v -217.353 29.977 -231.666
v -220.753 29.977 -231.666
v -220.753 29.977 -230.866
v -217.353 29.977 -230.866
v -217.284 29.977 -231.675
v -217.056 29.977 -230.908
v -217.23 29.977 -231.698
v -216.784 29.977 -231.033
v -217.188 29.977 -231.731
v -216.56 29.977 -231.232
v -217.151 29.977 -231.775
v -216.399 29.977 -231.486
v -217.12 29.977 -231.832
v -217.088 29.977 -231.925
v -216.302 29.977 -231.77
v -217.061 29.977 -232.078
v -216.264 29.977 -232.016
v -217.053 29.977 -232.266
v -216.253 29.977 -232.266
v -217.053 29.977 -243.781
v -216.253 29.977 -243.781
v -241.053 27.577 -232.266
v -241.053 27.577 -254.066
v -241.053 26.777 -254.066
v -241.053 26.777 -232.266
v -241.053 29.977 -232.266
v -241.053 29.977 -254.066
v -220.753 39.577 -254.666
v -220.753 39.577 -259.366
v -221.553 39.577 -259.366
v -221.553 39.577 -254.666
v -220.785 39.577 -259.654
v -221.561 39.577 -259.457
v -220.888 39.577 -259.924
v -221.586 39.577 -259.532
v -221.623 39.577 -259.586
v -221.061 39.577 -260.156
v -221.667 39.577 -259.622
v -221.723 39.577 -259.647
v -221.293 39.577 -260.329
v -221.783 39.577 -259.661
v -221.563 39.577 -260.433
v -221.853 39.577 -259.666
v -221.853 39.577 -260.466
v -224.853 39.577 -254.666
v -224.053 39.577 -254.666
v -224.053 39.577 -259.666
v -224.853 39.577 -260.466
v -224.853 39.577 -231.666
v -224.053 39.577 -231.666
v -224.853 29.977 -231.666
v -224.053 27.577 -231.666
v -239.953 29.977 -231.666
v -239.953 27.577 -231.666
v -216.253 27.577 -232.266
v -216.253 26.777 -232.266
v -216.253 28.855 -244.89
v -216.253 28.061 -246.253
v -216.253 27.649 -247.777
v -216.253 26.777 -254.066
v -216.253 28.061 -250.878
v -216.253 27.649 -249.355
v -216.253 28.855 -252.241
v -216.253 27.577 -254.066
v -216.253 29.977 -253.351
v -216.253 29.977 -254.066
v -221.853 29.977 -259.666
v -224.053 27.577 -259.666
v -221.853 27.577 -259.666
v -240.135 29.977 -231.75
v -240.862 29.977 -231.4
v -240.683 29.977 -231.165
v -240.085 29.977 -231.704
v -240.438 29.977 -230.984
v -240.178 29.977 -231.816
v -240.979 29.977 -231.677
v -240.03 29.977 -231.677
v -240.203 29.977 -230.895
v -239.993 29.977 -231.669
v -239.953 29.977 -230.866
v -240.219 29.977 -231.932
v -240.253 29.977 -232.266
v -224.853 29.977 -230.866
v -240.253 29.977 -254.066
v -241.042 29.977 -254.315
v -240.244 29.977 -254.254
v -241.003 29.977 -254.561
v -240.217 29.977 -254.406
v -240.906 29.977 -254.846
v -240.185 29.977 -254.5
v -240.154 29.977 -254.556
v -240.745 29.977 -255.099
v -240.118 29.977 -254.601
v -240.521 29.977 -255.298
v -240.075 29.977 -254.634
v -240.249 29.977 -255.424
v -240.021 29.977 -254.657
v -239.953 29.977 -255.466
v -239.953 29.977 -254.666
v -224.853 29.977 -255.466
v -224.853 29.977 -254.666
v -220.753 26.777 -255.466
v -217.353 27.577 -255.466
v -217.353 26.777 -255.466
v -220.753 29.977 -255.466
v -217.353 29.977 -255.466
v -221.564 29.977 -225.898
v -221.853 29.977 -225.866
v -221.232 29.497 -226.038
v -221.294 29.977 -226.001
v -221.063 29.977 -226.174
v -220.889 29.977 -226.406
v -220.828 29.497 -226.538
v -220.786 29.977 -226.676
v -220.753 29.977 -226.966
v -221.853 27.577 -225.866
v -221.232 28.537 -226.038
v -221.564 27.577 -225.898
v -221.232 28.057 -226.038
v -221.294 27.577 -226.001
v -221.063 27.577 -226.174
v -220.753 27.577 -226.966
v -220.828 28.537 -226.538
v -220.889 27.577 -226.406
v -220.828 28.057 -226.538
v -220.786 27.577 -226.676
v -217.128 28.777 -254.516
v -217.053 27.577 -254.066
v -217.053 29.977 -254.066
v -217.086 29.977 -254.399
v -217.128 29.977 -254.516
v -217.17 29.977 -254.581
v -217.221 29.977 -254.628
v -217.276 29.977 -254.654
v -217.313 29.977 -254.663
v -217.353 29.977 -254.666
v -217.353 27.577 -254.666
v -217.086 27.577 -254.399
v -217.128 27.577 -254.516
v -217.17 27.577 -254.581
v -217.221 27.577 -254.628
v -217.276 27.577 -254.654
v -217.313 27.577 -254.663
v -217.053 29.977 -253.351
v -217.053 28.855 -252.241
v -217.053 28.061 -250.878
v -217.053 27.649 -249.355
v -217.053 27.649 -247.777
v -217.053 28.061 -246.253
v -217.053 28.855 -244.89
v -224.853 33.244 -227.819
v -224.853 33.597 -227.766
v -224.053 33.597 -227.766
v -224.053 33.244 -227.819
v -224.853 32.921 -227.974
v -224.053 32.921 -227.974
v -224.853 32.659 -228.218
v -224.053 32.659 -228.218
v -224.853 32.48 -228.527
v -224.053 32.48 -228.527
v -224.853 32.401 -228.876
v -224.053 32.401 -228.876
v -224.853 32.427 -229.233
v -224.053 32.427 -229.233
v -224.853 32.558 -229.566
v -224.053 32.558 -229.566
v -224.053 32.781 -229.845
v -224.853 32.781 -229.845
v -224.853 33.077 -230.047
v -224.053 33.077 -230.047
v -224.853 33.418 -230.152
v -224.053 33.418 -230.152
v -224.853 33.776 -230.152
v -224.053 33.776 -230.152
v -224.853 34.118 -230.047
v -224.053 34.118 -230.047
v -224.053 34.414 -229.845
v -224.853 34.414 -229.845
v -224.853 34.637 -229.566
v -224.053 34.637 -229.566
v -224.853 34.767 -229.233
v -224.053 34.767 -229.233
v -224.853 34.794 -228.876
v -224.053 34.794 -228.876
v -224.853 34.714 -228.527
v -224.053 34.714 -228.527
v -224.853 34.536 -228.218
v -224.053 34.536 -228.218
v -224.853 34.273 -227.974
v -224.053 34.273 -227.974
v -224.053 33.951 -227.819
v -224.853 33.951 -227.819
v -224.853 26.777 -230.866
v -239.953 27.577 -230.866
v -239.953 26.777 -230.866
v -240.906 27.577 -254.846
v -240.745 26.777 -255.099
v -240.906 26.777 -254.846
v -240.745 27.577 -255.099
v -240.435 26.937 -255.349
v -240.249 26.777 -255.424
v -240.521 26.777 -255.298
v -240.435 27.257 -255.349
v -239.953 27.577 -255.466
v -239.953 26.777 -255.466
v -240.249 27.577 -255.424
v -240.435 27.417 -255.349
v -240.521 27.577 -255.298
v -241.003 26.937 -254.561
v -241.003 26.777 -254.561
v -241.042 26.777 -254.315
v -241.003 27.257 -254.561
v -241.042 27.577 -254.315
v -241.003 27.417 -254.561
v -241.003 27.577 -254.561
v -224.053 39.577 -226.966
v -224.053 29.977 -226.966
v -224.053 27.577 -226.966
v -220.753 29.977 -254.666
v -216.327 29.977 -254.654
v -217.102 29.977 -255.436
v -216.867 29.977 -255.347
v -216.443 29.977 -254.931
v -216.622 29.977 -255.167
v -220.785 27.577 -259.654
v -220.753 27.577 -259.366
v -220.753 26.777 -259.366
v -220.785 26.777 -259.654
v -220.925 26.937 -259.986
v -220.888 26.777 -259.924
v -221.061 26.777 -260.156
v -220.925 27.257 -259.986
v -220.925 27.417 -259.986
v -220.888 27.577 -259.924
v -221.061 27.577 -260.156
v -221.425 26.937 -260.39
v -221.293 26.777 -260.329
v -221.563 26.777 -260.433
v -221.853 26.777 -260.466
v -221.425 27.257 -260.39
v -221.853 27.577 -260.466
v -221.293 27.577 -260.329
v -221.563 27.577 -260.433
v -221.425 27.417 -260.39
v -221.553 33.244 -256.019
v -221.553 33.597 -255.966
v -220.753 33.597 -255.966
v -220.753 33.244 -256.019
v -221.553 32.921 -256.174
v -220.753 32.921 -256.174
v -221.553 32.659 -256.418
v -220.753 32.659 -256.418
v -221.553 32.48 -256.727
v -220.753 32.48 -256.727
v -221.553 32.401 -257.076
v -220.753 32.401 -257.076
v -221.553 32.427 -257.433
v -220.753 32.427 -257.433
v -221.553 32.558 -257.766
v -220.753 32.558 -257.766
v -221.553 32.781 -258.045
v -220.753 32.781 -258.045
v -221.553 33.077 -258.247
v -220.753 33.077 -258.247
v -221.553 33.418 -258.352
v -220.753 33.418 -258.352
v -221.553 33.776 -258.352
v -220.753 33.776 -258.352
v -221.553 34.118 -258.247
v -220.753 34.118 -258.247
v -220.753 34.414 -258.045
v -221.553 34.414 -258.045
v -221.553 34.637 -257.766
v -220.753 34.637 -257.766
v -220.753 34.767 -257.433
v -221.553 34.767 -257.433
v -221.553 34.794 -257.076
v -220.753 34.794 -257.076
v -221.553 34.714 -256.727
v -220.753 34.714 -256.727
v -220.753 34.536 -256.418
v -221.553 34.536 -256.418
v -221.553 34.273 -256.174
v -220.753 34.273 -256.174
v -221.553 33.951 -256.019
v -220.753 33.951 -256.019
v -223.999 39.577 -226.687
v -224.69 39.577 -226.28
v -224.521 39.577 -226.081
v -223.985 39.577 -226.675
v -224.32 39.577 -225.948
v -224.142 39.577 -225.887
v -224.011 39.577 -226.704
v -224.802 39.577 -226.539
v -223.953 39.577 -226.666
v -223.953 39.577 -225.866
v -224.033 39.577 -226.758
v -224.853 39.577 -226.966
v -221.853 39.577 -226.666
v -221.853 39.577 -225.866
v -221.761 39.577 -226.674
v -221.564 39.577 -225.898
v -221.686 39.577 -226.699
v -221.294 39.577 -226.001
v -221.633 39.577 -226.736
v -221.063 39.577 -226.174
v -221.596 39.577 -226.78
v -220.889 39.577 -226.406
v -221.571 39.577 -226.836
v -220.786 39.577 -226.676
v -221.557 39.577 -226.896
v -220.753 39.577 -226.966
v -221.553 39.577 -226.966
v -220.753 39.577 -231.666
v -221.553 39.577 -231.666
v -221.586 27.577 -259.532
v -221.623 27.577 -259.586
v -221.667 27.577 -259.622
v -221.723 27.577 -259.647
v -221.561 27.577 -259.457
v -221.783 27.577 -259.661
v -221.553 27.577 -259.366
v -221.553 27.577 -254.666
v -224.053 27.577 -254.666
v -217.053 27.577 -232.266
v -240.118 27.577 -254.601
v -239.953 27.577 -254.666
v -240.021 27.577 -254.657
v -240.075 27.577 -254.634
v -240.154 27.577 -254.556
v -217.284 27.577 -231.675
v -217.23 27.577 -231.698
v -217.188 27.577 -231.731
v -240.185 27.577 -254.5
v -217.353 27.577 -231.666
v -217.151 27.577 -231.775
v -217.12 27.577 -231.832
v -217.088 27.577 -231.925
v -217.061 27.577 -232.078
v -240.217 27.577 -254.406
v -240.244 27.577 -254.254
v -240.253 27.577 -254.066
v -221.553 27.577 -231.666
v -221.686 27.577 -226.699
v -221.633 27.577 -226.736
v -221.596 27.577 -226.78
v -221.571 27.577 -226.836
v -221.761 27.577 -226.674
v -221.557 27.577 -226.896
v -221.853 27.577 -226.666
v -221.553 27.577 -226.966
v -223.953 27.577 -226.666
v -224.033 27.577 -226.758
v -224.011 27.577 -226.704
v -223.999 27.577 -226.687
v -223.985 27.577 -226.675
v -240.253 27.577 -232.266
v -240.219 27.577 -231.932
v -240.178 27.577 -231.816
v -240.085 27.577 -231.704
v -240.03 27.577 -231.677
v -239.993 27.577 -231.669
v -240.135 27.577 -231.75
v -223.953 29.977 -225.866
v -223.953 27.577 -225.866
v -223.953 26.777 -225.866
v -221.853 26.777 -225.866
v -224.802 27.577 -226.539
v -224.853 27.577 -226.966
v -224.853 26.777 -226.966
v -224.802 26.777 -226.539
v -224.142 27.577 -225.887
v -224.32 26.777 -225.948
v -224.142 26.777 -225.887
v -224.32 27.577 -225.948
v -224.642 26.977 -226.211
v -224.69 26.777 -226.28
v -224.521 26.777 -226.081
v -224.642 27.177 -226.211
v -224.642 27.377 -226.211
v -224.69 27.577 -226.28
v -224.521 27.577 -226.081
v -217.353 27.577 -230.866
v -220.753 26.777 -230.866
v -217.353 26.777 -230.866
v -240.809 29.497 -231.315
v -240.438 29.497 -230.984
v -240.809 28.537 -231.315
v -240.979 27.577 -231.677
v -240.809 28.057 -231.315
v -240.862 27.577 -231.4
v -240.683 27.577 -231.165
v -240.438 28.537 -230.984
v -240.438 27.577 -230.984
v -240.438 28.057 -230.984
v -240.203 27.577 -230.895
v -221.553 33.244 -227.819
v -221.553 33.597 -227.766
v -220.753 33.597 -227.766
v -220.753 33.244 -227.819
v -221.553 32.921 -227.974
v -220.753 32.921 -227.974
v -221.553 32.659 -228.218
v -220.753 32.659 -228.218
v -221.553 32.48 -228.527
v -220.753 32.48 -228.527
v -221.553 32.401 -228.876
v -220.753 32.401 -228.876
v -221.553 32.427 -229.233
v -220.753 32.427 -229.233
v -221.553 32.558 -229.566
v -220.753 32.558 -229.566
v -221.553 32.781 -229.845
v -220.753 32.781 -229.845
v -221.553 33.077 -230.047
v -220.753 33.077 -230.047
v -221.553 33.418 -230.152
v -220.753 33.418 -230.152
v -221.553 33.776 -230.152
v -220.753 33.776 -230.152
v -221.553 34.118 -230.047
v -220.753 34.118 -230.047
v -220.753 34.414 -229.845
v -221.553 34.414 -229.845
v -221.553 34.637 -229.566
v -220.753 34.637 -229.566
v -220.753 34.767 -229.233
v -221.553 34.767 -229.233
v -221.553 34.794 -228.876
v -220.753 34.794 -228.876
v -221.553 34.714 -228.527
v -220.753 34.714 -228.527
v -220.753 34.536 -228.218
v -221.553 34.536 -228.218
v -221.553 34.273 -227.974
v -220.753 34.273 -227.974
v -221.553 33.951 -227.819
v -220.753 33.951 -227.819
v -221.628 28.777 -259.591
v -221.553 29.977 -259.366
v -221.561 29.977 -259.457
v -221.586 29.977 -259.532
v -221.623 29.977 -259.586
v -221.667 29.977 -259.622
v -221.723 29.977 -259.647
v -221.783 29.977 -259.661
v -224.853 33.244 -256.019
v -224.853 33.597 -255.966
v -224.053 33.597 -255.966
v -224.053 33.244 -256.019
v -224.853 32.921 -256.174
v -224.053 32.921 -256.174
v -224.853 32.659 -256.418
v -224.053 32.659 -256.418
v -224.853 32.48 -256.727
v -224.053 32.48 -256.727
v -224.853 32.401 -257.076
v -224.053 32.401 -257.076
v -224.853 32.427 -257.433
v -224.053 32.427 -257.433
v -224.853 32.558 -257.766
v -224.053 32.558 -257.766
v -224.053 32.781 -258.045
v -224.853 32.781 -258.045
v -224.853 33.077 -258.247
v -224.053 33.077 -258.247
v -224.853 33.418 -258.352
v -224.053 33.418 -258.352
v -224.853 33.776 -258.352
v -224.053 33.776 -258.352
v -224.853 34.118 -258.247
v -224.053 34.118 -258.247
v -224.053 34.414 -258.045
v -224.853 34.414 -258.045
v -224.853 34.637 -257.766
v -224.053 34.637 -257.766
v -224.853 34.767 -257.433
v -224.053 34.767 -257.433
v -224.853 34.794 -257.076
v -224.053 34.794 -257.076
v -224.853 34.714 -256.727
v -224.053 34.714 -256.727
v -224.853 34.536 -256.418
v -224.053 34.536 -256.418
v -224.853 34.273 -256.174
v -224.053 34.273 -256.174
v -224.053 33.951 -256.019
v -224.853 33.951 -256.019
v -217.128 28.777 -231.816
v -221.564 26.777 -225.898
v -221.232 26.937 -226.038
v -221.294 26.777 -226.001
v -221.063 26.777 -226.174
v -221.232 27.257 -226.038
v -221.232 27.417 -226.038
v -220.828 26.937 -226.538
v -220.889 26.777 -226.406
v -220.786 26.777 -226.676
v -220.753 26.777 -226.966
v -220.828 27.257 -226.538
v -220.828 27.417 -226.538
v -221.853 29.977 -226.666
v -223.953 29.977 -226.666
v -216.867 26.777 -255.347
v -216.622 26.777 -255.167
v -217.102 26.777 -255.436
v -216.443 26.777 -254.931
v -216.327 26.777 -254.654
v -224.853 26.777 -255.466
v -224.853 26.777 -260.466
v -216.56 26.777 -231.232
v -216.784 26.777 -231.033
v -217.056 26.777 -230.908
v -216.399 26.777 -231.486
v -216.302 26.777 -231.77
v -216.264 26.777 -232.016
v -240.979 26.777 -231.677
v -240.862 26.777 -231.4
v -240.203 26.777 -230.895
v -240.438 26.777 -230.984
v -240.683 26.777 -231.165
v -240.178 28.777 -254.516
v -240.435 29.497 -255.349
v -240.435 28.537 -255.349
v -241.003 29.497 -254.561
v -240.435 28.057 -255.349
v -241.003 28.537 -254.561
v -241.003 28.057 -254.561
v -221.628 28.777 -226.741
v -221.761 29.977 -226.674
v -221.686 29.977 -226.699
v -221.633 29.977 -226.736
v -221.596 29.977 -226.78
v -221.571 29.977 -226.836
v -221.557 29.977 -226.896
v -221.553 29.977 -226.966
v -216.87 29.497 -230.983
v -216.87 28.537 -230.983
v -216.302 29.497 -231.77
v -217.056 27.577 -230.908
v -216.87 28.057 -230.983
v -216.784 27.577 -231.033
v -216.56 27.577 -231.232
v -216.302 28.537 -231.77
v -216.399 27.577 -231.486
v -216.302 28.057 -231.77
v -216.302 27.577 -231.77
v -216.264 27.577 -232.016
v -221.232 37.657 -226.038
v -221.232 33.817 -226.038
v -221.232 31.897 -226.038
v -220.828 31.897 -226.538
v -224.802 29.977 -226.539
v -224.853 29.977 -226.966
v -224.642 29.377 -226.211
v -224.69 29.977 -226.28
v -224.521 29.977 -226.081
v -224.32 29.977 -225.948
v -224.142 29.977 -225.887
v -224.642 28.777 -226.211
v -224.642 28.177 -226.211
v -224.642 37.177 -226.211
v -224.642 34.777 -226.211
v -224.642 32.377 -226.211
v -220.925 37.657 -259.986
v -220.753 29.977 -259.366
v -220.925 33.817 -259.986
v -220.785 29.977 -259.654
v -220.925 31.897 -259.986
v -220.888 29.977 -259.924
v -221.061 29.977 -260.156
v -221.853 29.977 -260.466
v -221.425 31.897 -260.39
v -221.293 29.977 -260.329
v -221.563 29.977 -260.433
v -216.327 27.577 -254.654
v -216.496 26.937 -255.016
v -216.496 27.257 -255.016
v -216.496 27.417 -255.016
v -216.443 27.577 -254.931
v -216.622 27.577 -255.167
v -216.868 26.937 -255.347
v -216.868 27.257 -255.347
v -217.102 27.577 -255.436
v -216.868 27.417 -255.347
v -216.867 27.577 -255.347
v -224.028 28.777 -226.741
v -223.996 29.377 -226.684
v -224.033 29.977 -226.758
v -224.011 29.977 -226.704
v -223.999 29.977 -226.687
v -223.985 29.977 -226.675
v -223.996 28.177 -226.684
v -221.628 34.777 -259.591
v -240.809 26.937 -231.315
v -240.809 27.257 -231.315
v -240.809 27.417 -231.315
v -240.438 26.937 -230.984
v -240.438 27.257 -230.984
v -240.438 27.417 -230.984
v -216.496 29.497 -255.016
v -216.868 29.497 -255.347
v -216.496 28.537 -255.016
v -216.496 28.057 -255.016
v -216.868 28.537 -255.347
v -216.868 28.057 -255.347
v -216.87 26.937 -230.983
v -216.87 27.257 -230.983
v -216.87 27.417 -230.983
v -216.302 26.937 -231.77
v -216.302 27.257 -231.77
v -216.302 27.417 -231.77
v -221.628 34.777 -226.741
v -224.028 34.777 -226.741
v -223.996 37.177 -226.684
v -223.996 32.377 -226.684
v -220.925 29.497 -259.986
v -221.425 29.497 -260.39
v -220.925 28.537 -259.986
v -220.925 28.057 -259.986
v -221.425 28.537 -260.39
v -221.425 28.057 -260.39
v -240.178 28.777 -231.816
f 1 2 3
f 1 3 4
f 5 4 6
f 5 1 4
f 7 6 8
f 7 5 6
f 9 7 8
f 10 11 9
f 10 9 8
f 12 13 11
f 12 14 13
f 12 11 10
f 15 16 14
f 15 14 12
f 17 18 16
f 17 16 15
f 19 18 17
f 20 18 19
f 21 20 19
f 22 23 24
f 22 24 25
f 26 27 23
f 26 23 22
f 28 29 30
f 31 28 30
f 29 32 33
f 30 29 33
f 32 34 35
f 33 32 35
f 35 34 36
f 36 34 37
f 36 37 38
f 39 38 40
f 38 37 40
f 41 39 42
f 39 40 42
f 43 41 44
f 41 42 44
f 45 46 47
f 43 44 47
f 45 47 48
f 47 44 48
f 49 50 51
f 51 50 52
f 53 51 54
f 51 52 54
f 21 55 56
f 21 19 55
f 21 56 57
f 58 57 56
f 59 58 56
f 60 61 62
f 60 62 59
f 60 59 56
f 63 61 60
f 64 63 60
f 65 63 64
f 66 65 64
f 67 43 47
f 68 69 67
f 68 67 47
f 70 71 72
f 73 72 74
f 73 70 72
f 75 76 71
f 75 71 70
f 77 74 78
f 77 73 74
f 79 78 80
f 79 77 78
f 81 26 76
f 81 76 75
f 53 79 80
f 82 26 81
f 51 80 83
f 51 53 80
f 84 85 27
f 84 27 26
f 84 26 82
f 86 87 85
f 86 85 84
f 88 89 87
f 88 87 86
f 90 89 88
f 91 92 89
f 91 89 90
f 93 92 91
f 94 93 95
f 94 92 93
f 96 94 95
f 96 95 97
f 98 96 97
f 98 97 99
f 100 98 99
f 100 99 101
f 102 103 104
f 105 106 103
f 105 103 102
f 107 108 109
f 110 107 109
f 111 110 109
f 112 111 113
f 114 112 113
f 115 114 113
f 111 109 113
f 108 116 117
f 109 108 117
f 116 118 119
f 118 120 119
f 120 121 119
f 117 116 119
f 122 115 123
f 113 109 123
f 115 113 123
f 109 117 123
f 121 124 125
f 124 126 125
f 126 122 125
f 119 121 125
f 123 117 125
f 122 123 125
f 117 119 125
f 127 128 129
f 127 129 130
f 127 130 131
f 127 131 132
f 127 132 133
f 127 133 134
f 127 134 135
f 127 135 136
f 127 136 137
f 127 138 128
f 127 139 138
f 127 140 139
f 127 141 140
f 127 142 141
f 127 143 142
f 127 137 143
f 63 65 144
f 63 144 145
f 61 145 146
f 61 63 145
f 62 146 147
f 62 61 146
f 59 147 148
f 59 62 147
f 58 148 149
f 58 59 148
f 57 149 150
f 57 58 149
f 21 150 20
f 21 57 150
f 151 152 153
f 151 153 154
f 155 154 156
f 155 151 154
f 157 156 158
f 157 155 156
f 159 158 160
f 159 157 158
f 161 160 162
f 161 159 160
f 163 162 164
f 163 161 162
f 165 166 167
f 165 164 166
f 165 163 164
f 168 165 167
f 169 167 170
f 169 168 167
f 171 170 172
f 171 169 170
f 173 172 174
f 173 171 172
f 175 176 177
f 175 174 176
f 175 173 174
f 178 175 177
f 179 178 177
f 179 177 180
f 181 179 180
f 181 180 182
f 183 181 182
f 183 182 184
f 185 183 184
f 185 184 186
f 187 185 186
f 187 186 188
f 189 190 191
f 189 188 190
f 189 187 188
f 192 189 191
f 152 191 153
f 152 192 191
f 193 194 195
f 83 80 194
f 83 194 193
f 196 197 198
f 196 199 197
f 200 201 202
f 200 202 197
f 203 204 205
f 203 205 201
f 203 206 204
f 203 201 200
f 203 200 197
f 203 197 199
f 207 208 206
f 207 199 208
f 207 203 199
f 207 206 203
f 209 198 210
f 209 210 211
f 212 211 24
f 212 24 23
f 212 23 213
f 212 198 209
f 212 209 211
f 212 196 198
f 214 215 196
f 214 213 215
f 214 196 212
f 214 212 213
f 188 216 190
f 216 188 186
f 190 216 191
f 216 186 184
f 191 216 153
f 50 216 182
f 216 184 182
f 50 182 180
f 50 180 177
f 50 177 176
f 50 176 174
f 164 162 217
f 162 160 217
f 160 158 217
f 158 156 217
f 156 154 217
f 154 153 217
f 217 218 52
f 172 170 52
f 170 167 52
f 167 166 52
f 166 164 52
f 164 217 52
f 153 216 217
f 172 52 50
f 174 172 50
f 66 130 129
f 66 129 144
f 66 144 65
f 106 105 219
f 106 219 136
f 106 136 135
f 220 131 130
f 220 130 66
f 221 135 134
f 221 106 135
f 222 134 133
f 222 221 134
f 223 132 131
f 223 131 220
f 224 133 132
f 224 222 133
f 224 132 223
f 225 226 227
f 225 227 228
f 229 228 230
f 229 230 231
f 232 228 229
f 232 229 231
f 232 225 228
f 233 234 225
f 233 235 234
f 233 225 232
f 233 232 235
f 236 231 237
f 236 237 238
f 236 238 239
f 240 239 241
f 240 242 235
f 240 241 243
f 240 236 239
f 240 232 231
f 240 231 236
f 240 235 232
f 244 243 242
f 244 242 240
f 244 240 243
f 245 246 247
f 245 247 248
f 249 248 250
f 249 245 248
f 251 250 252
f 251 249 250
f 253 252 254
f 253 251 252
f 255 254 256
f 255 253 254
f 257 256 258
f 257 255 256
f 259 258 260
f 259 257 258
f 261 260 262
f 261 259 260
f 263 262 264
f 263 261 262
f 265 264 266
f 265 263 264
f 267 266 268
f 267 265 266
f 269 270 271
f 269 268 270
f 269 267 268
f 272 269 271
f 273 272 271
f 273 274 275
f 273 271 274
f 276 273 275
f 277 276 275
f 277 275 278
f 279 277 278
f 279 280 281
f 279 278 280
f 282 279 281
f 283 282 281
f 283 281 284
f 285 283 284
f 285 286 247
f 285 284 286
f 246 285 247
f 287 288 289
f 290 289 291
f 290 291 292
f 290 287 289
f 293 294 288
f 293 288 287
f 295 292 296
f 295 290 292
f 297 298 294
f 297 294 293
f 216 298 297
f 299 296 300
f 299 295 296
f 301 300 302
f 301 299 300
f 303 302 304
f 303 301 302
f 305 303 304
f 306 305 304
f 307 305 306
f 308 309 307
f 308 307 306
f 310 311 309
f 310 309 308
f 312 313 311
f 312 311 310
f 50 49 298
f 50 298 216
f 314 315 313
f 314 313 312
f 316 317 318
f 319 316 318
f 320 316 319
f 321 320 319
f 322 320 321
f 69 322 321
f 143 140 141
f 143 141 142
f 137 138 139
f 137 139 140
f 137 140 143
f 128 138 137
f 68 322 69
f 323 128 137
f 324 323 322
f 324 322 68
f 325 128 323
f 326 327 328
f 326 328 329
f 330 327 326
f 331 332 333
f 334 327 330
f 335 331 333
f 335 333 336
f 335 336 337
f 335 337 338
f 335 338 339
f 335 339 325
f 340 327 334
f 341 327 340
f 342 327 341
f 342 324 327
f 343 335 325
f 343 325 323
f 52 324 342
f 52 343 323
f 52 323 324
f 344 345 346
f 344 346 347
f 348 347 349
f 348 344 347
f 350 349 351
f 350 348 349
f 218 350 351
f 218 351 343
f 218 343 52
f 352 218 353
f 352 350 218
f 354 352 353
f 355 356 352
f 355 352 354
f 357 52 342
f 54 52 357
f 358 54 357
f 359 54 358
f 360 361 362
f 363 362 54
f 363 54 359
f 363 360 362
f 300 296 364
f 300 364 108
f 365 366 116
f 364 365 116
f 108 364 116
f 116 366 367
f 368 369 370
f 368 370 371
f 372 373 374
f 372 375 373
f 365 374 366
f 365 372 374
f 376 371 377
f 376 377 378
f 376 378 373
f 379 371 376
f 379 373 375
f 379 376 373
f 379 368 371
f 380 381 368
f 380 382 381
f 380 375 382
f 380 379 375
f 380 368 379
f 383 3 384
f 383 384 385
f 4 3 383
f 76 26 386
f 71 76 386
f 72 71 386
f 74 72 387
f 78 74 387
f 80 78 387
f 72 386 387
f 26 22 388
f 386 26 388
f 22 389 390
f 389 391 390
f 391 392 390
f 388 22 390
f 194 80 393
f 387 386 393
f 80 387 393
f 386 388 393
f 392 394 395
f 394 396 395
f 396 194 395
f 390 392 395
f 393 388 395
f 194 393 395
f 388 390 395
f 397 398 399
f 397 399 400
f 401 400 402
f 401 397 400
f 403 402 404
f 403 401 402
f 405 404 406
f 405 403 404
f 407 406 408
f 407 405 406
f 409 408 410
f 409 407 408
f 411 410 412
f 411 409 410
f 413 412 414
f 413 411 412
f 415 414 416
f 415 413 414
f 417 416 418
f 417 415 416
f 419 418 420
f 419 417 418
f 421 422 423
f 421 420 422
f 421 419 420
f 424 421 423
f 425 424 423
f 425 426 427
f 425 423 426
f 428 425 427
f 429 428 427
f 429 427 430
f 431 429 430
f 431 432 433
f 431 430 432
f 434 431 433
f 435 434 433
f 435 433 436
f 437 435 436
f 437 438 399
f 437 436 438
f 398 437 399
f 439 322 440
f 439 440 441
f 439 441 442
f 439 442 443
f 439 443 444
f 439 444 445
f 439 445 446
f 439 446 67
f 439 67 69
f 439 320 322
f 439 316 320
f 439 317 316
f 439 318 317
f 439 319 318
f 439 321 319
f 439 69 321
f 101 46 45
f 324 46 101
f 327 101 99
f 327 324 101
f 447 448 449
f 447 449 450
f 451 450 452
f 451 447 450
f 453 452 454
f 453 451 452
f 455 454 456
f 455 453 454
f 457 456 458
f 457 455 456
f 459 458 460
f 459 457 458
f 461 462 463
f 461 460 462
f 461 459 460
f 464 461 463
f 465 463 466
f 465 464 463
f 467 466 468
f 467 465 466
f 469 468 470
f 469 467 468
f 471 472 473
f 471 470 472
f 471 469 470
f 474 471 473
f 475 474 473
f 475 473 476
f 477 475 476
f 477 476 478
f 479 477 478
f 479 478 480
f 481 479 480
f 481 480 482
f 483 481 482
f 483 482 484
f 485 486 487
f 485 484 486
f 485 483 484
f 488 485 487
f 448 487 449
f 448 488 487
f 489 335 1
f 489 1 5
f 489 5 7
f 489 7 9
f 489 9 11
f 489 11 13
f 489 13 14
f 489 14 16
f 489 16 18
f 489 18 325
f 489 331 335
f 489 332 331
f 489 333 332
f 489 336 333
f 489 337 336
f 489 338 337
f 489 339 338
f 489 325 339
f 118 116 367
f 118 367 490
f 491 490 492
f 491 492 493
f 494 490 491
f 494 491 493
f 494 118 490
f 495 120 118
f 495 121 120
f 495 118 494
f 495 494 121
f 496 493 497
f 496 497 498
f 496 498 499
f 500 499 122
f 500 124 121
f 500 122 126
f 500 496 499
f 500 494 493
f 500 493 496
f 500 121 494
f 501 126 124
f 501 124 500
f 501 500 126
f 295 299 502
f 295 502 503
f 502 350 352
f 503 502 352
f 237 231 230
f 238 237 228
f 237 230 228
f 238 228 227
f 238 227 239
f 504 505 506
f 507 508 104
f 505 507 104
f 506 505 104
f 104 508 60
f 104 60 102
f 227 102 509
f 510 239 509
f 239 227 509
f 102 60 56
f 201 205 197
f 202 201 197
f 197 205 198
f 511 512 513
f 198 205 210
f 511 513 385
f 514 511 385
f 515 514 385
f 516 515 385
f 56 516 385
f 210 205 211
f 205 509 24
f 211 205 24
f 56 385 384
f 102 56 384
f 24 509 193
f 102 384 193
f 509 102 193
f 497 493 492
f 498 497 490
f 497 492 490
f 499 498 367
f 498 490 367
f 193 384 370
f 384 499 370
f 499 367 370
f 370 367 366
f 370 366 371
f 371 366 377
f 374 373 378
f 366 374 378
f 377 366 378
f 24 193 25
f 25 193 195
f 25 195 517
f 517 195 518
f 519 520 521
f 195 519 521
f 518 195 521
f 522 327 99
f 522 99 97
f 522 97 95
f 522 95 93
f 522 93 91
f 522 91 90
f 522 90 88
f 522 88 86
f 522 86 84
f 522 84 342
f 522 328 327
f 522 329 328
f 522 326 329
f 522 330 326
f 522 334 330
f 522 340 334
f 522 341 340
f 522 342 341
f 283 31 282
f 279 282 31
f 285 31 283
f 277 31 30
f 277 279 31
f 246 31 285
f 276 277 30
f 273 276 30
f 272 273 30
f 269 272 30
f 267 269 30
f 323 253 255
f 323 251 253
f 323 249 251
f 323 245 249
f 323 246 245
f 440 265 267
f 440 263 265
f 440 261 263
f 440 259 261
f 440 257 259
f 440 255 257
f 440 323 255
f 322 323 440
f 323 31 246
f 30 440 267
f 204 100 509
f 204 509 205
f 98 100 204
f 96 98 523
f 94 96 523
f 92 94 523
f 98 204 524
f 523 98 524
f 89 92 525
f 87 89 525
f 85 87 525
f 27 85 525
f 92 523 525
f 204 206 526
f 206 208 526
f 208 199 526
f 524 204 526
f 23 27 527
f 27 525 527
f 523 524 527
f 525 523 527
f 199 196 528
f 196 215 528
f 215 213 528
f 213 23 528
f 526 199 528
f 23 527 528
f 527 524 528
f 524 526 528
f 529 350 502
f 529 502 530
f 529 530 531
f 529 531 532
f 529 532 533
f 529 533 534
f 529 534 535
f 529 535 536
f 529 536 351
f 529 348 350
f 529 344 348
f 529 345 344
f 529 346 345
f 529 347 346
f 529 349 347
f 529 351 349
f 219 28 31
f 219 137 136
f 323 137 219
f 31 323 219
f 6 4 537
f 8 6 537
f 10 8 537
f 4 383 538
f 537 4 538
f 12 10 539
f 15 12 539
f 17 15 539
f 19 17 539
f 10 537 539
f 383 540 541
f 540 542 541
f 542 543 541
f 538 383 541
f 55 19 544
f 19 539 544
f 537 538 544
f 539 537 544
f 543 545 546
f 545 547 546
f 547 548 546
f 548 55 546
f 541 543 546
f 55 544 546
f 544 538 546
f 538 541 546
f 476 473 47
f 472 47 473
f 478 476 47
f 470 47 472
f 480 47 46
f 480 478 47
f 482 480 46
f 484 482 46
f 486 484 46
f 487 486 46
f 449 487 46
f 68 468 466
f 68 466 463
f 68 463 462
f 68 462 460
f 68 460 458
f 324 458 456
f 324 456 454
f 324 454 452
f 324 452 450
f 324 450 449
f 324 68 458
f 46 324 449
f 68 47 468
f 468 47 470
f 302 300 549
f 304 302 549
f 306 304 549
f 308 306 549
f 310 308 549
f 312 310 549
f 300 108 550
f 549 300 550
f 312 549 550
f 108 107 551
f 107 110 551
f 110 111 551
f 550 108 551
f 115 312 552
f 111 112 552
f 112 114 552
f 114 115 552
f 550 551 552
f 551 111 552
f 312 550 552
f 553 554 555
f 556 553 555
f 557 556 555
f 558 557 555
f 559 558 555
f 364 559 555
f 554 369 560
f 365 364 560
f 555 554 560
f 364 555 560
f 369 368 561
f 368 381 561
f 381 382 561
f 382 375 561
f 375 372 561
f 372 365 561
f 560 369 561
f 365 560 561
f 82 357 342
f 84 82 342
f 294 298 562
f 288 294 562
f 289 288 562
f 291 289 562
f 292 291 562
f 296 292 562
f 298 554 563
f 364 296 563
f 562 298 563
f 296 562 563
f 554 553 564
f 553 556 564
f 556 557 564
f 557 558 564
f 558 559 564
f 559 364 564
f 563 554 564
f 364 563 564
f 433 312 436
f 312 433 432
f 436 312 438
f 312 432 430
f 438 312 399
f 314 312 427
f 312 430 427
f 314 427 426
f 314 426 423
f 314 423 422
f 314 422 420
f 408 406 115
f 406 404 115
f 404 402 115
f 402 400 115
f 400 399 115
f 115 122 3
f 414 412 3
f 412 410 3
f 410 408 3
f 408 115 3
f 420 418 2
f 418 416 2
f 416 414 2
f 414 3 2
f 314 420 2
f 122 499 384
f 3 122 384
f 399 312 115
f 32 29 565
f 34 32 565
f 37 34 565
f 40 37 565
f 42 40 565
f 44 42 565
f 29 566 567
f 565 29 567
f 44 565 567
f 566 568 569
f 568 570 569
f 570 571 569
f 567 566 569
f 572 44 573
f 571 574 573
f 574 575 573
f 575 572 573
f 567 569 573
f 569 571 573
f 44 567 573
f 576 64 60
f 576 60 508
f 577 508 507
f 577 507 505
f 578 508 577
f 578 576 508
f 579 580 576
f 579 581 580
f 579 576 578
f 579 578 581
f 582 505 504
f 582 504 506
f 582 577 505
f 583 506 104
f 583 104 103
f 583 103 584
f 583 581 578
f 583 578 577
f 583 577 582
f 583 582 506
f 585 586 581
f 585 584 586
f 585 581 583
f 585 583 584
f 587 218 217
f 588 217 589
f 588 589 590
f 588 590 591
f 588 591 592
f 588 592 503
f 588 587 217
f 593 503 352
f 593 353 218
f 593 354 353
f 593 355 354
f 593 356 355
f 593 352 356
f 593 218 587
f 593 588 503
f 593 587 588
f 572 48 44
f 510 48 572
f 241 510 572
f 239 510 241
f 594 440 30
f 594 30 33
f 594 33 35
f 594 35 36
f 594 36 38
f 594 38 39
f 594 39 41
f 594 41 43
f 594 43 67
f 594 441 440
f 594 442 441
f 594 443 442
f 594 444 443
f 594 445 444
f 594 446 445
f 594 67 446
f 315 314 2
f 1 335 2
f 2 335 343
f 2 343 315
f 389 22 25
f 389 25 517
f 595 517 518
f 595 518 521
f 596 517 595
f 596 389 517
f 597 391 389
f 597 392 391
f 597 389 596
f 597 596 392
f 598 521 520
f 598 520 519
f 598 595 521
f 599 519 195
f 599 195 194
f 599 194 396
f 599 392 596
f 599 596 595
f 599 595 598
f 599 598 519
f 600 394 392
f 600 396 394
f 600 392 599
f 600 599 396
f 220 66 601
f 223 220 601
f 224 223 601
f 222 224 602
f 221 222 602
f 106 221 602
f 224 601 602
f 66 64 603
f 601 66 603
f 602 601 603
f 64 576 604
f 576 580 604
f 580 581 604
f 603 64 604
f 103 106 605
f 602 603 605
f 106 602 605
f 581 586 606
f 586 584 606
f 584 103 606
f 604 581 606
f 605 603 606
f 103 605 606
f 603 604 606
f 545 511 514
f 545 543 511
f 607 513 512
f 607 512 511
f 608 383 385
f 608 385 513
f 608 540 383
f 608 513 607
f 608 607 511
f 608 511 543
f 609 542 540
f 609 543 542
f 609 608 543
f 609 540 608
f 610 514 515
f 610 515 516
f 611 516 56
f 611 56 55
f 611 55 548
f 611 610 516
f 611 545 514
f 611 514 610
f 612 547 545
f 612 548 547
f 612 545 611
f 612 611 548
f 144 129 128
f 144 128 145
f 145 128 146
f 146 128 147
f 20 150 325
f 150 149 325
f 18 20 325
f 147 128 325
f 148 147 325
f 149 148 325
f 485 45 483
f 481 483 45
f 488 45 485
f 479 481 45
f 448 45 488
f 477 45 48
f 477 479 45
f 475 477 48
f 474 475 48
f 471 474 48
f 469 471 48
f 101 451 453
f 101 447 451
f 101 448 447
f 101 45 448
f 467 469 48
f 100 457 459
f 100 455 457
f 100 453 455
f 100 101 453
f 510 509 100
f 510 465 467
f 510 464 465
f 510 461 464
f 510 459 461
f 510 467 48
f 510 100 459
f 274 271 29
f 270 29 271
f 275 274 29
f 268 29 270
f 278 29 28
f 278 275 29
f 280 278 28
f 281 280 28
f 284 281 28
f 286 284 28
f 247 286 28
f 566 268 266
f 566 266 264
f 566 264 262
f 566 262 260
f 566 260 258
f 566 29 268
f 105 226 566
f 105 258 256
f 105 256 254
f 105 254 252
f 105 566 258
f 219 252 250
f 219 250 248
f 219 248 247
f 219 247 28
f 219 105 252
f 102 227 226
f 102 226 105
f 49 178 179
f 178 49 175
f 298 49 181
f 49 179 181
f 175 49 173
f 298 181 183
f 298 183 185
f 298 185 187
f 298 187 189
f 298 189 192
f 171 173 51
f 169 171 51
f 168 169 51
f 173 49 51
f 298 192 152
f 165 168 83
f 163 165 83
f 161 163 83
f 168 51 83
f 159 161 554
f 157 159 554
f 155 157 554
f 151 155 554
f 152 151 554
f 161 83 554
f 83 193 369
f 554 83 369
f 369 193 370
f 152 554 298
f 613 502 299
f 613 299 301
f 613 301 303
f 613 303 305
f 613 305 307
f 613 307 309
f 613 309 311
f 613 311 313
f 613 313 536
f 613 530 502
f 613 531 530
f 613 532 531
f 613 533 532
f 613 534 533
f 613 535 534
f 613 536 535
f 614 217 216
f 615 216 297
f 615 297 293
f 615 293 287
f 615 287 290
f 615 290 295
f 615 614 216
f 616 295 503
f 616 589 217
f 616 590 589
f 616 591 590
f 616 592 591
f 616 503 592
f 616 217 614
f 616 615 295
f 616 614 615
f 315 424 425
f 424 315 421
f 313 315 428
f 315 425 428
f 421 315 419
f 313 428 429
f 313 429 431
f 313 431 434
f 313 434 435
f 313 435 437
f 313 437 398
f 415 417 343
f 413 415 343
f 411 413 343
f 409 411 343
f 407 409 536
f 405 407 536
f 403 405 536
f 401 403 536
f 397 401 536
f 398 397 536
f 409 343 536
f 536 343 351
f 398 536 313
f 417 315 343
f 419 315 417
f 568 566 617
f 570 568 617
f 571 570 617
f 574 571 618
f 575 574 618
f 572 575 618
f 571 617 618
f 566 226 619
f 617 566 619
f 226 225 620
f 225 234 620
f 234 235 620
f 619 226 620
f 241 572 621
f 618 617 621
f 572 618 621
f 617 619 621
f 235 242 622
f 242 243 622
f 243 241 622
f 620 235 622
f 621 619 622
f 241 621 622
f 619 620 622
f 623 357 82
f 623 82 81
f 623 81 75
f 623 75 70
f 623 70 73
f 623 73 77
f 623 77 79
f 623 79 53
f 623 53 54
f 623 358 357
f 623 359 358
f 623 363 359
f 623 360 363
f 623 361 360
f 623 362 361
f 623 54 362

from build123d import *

# Parameters (mm, degrees)
EXTRUDE_THIN1_DEPTH     = 2.4
CUT_EXTRUDE1_DEPTH      = 10
BOSS_EXTRUDE1_DEPTH     = 0.8
BOSS_EXTRUDE2_DEPTH     = 9.6
CUT_EXTRUDE2_DEPTH      = 10
CUT_EXTRUDE2_DEPTH_BACK = 9.6
SKETCH5_R               = 1.2
BOSS_EXTRUDE3_DEPTH     = 9.6
CUT_EXTRUDE3_DEPTH      = 10
CUT_EXTRUDE3_DEPTH_BACK = 9.6
SKETCH8_R               = 1.2


# Read off the part's stored shape, not the designer's step: Extrude-Thin1
with BuildPart() as part:
    # Extrude-Thin1 outline → Extrude-Thin1 (new body)
    with BuildSketch(Plane(origin=(0, 27.577339236, 0), x_dir=(1, 0, 0), z_dir=(0, 1, 0))):
        with BuildLine():
            Line((-221.85268026, 260.465727588), (-224.85268026, 260.465727588))
            Line((-224.85268026, 260.465727588), (-224.85268026, 255.465727588))
            Line((-224.85268026, 255.465727588), (-239.95268026, 255.465727588))
            add(Edge.make_bspline(
                [(-239.95268026, 255.465727588), (-240.036953855, 255.465727588), (-240.119634905, 255.456128928), (-240.281715302, 255.417151974), (-240.361409143, 255.387305758), (-240.582321505, 255.271729013), (-240.710305754, 255.157186074), (-240.902423276, 254.88238325), (-240.965907148, 254.723899526), (-241.040211449, 254.398738857), (-241.05268026, 254.23302474), (-241.05268026, 254.065727588)],
                knots=[0, 0, 0, 0, 0.125, 0.125, 0.25, 0.25, 0.5, 0.5, 0.75, 0.75, 1, 1, 1, 1], degree=3))
            Line((-241.05268026, 254.065727588), (-241.05268026, 232.26572715))
            add(Edge.make_bspline(
                [(-241.05268026, 232.26572715), (-241.05268026, 232.098807375), (-241.040173408, 231.934007095), (-240.967365099, 231.612506131), (-240.904171119, 231.452780727), (-240.761375105, 231.246738134), (-240.705083291, 231.182493851), (-240.580845123, 231.071317608), (-240.512324697, 231.023373693), (-240.287950739, 230.905193813), (-240.121895067, 230.865727588), (-239.95268026, 230.865727588)],
                knots=[0, 0, 0, 0, 0.25, 0.25, 0.5, 0.5, 0.625, 0.625, 0.75, 0.75, 1, 1, 1, 1], degree=3))
            Line((-239.95268026, 230.865727588), (-224.85268026, 230.865727588))
            Line((-224.85268026, 230.865727588), (-224.85268026, 226.965727588))
            add(Edge.make_bspline(
                [(-224.85268026, 226.965727588), (-224.85268026, 226.832263963), (-224.842915454, 226.699977447), (-224.778312529, 226.440837832), (-224.722765281, 226.317121604), (-224.561642632, 226.104378576), (-224.457129257, 226.016716914), (-224.220278277, 225.897626505), (-224.087183417, 225.865727588), (-223.95268026, 225.865727588)],
                knots=[0, 0, 0, 0, 0.25, 0.25, 0.5, 0.5, 0.75, 0.75, 1, 1, 1, 1], degree=3))
            Line((-223.95268026, 225.865727588), (-221.85268026, 225.865727588))
            add(Edge.make_bspline(
                [(-221.85268026, 225.865727588), (-221.706401491, 225.865727588), (-221.561598635, 225.889080891), (-221.357734958, 225.966629211), (-221.293267189, 225.998955372), (-221.171531343, 226.076981138), (-221.11379386, 226.123323344), (-220.960069989, 226.2768079), (-220.879771324, 226.40237724), (-220.776526804, 226.672909538), (-220.75268026, 226.819308973), (-220.75268026, 226.965727588)],
                knots=[0, 0, 0, 0, 0.25, 0.25, 0.375, 0.375, 0.5, 0.5, 0.75, 0.75, 1, 1, 1, 1], degree=3))
            Line((-220.75268026, 226.965727588), (-220.75268026, 230.865727588))
            Line((-220.75268026, 230.865727588), (-217.35268026, 230.865727588))
            add(Edge.make_bspline(
                [(-217.35268026, 230.865727588), (-217.268406659, 230.865727588), (-217.185725604, 230.875326251), (-217.023645197, 230.914303211), (-216.943951352, 230.944149433), (-216.723038981, 231.059726197), (-216.595054733, 231.174269153), (-216.402937217, 231.449072013), (-216.339453355, 231.607555751), (-216.265149067, 231.932716443), (-216.25268026, 232.098430571), (-216.25268026, 232.265727733)],
                knots=[0, 0, 0, 0, 0.125, 0.125, 0.25, 0.25, 0.5, 0.5, 0.75, 0.75, 1, 1, 1, 1], degree=3))
            Line((-216.25268026, 232.265727733), (-216.25268026, 254.065727588))
            add(Edge.make_bspline(
                [(-216.25268026, 254.065727588), (-216.25268026, 254.232647394), (-216.265187101, 254.397447706), (-216.337995368, 254.718948734), (-216.401189322, 254.878674187), (-216.543985311, 255.084716854), (-216.600277123, 255.148961165), (-216.724515296, 255.260137461), (-216.793035717, 255.308081394), (-217.017409717, 255.426261342), (-217.183465417, 255.465727588), (-217.35268026, 255.465727588)],
                knots=[0, 0, 0, 0, 0.25, 0.25, 0.5, 0.5, 0.625, 0.625, 0.75, 0.75, 1, 1, 1, 1], degree=3))
            Line((-217.35268026, 255.465727588), (-220.75268026, 255.465727588))
            Line((-220.75268026, 255.465727588), (-220.75268026, 259.365727588))
            add(Edge.make_bspline(
                [(-220.75268026, 259.365727588), (-220.75268026, 259.512006357), (-220.776033562, 259.656809213), (-220.853581882, 259.86067289), (-220.885908043, 259.925140659), (-220.96393381, 260.046876505), (-221.010276016, 260.104613988), (-221.163760572, 260.258337859), (-221.289329911, 260.338636524), (-221.559862209, 260.441881044), (-221.706261645, 260.465727588), (-221.85268026, 260.465727588)],
                knots=[0, 0, 0, 0, 0.25, 0.25, 0.375, 0.375, 0.5, 0.5, 0.75, 0.75, 1, 1, 1, 1], degree=3))
        make_face()
        with BuildLine():
            Line((-224.05268026, 254.665727588), (-224.05268026, 259.665727588))
            Line((-224.05268026, 259.665727588), (-221.85268026, 259.665727588))
            add(Edge.make_bspline(
                [(-221.55268026, 259.365727588), (-221.55268026, 259.665727588), (-221.85268026, 259.665727588)],
                knots=[0, 0, 0, 1, 1, 1], degree=2))
            Line((-221.55268026, 259.365727588), (-221.55268026, 254.665727588))
            Line((-221.55268026, 254.665727588), (-217.35268026, 254.665727588))
            add(Edge.make_bspline(
                [(-217.05268026, 254.065727588), (-217.05268026, 254.665727588), (-217.35268026, 254.665727588)],
                knots=[0, 0, 0, 1, 1, 1], degree=2))
            Line((-217.05268026, 254.065727588), (-217.05268026, 232.265727733))
            add(Edge.make_bspline(
                [(-217.35268026, 231.665727588), (-217.05268026, 231.665727588), (-217.05268026, 232.265727733)],
                knots=[0, 0, 0, 1, 1, 1], degree=2))
            Line((-217.35268026, 231.665727588), (-221.55268026, 231.665727588))
            Line((-221.55268026, 231.665727588), (-221.55268026, 226.965727588))
            add(Edge.make_bspline(
                [(-221.85268026, 226.665727588), (-221.55268026, 226.665727588), (-221.55268026, 226.965727588)],
                knots=[0, 0, 0, 1, 1, 1], degree=2))
            Line((-221.85268026, 226.665727588), (-223.95268026, 226.665727588))
            add(Edge.make_bspline(
                [(-224.05268026, 226.965727588), (-224.05268026, 226.665727588), (-223.95268026, 226.665727588)],
                knots=[0, 0, 0, 1, 1, 1], degree=2))
            Line((-224.05268026, 226.965727588), (-224.05268026, 231.665727588))
            Line((-224.05268026, 231.665727588), (-239.95268026, 231.665727588))
            add(Edge.make_bspline(
                [(-240.25268026, 232.26572715), (-240.25268026, 231.665727588), (-239.95268026, 231.665727588)],
                knots=[0, 0, 0, 1, 1, 1], degree=2))
            Line((-240.25268026, 232.26572715), (-240.25268026, 254.065727588))
            add(Edge.make_bspline(
                [(-239.95268026, 254.665727588), (-240.25268026, 254.665727588), (-240.25268026, 254.065727588)],
                knots=[0, 0, 0, 1, 1, 1], degree=2))
            Line((-239.95268026, 254.665727588), (-224.05268026, 254.665727588))
        make_face(mode=Mode.SUBTRACT)
    extrude(amount=EXTRUDE_THIN1_DEPTH)

    # Sketch2 → Cut-Extrude1 (cut)
    with BuildSketch(Plane(origin=(-216.25268026, 0, 0), x_dir=(0, 0, -1), z_dir=(1, 0, 0))):
        with BuildLine():
            Line((243.543526876, 30.314428941), (253.35066228, 29.977339236))
            ThreePointArc((253.35066228, 29.977339236), (248.359618009, 27.600880377), (243.543526876, 30.314428941))
        make_face()
    extrude(amount=-CUT_EXTRUDE1_DEPTH, mode=Mode.SUBTRACT)

    # Sketch3 → Boss-Extrude1 (add)
    with BuildSketch(Plane.XZ.offset(-27.577339236)):
        with BuildLine():
            Line((-217.35268026, -255.465727588), (-220.75268026, -255.465727588))
            Line((-220.75268026, -255.465727588), (-220.75268026, -259.365727588))
            add(Edge.make_bspline(
                [(-220.75268026, -259.365727588), (-220.75268026, -259.512006357), (-220.776033562, -259.656809213), (-220.853581882, -259.86067289), (-220.885908043, -259.925140659), (-220.96393381, -260.046876505), (-221.010276016, -260.104613988), (-221.163760572, -260.258337859), (-221.289329911, -260.338636524), (-221.559862209, -260.441881044), (-221.706261645, -260.465727588), (-221.85268026, -260.465727588)],
                knots=[0, 0, 0, 0, 0.25, 0.25, 0.375, 0.375, 0.5, 0.5, 0.75, 0.75, 1, 1, 1, 1], degree=3))
            Line((-221.85268026, -260.465727588), (-224.85268026, -260.465727588))
            Line((-224.85268026, -260.465727588), (-224.85268026, -255.465727588))
            Line((-224.85268026, -255.465727588), (-239.95268026, -255.465727588))
            add(Edge.make_bspline(
                [(-239.95268026, -255.465727588), (-240.036953855, -255.465727588), (-240.119634905, -255.456128928), (-240.281715302, -255.417151974), (-240.361409143, -255.387305758), (-240.582321505, -255.271729013), (-240.710305754, -255.157186074), (-240.902423276, -254.88238325), (-240.965907148, -254.723899526), (-241.040211449, -254.398738857), (-241.05268026, -254.23302474), (-241.05268026, -254.065727588)],
                knots=[0, 0, 0, 0, 0.125, 0.125, 0.25, 0.25, 0.5, 0.5, 0.75, 0.75, 1, 1, 1, 1], degree=3))
            Line((-241.05268026, -254.065727588), (-241.05268026, -232.26572715))
            add(Edge.make_bspline(
                [(-241.05268026, -232.26572715), (-241.05268026, -232.098807375), (-241.040173408, -231.934007095), (-240.967365099, -231.612506131), (-240.904171119, -231.452780727), (-240.761375105, -231.246738134), (-240.705083291, -231.182493851), (-240.580845123, -231.071317608), (-240.512324697, -231.023373693), (-240.287950739, -230.905193813), (-240.121895067, -230.865727588), (-239.95268026, -230.865727588)],
                knots=[0, 0, 0, 0, 0.25, 0.25, 0.5, 0.5, 0.625, 0.625, 0.75, 0.75, 1, 1, 1, 1], degree=3))
            Line((-239.95268026, -230.865727588), (-224.85268026, -230.865727588))
            Line((-224.85268026, -230.865727588), (-224.85268026, -226.965727588))
            add(Edge.make_bspline(
                [(-224.85268026, -226.965727588), (-224.85268026, -226.832263963), (-224.842915454, -226.699977447), (-224.778312529, -226.440837832), (-224.722765281, -226.317121604), (-224.561642632, -226.104378576), (-224.457129257, -226.016716914), (-224.220278277, -225.897626505), (-224.087183417, -225.865727588), (-223.95268026, -225.865727588)],
                knots=[0, 0, 0, 0, 0.25, 0.25, 0.5, 0.5, 0.75, 0.75, 1, 1, 1, 1], degree=3))
            Line((-223.95268026, -225.865727588), (-221.85268026, -225.865727588))
            add(Edge.make_bspline(
                [(-221.85268026, -225.865727588), (-221.706401491, -225.865727588), (-221.561598635, -225.889080891), (-221.357734958, -225.966629211), (-221.293267189, -225.998955372), (-221.171531343, -226.076981138), (-221.11379386, -226.123323344), (-220.960069989, -226.2768079), (-220.879771324, -226.40237724), (-220.776526804, -226.672909538), (-220.75268026, -226.819308973), (-220.75268026, -226.965727588)],
                knots=[0, 0, 0, 0, 0.25, 0.25, 0.375, 0.375, 0.5, 0.5, 0.75, 0.75, 1, 1, 1, 1], degree=3))
            Line((-220.75268026, -226.965727588), (-220.75268026, -230.865727588))
            Line((-220.75268026, -230.865727588), (-217.35268026, -230.865727588))
            add(Edge.make_bspline(
                [(-217.35268026, -230.865727588), (-217.268406659, -230.865727588), (-217.185725604, -230.875326251), (-217.023645197, -230.914303211), (-216.943951352, -230.944149433), (-216.723038981, -231.059726197), (-216.595054733, -231.174269153), (-216.402937217, -231.449072013), (-216.339453355, -231.607555751), (-216.265149067, -231.932716443), (-216.25268026, -232.098430571), (-216.25268026, -232.265727733)],
                knots=[0, 0, 0, 0, 0.125, 0.125, 0.25, 0.25, 0.5, 0.5, 0.75, 0.75, 1, 1, 1, 1], degree=3))
            Line((-216.25268026, -232.265727733), (-216.25268026, -254.065727588))
            add(Edge.make_bspline(
                [(-216.25268026, -254.065727588), (-216.25268026, -254.232647394), (-216.265187101, -254.397447706), (-216.337995368, -254.718948734), (-216.401189322, -254.878674187), (-216.543985311, -255.084716854), (-216.600277123, -255.148961165), (-216.724515296, -255.260137461), (-216.793035717, -255.308081394), (-217.017409717, -255.426261342), (-217.183465417, -255.465727588), (-217.35268026, -255.465727588)],
                knots=[0, 0, 0, 0, 0.25, 0.25, 0.5, 0.5, 0.625, 0.625, 0.75, 0.75, 1, 1, 1, 1], degree=3))
        make_face()
    extrude(amount=BOSS_EXTRUDE1_DEPTH)

    # Sketch4 → Boss-Extrude2 (add)
    with BuildSketch(Plane(origin=(0, 29.977339236, 0), x_dir=(1, 0, 0), z_dir=(0, 1, 0))):
        with BuildLine():
            Line((-224.05268026, 231.665727588), (-224.85268026, 231.665727588))
            Line((-224.85268026, 231.665727588), (-224.85268026, 226.965727588))
            add(Edge.make_bspline(
                [(-224.85268026, 226.965727588), (-224.85268026, 226.832263963), (-224.842915454, 226.699977447), (-224.778312529, 226.440837832), (-224.722765281, 226.317121604), (-224.561642632, 226.104378576), (-224.457129257, 226.016716914), (-224.220278277, 225.897626505), (-224.087183417, 225.865727588), (-223.95268026, 225.865727588)],
                knots=[0, 0, 0, 0, 0.25, 0.25, 0.5, 0.5, 0.75, 0.75, 1, 1, 1, 1], degree=3))
            Line((-223.95268026, 225.865727588), (-221.85268026, 225.865727588))
            add(Edge.make_bspline(
                [(-221.85268026, 225.865727588), (-221.706401491, 225.865727588), (-221.561598635, 225.889080891), (-221.357734958, 225.966629211), (-221.293267189, 225.998955372), (-221.171531343, 226.076981138), (-221.11379386, 226.123323344), (-220.960069989, 226.2768079), (-220.879771324, 226.40237724), (-220.776526804, 226.672909538), (-220.75268026, 226.819308973), (-220.75268026, 226.965727588)],
                knots=[0, 0, 0, 0, 0.25, 0.25, 0.375, 0.375, 0.5, 0.5, 0.75, 0.75, 1, 1, 1, 1], degree=3))
            Line((-220.75268026, 226.965727588), (-220.75268026, 230.865727588))
            Line((-220.75268026, 230.865727588), (-220.75268026, 231.665727588))
            Line((-220.75268026, 231.665727588), (-221.55268026, 231.665727588))
            Line((-221.55268026, 231.665727588), (-221.55268026, 226.965727588))
            add(Edge.make_bspline(
                [(-221.85268026, 226.665727588), (-221.55268026, 226.665727588), (-221.55268026, 226.965727588)],
                knots=[0, 0, 0, 1, 1, 1], degree=2))
            Line((-221.85268026, 226.665727588), (-223.95268026, 226.665727588))
            add(Edge.make_bspline(
                [(-224.05268026, 226.965727588), (-224.05268026, 226.665727588), (-223.95268026, 226.665727588)],
                knots=[0, 0, 0, 1, 1, 1], degree=2))
            Line((-224.05268026, 226.965727588), (-224.05268026, 231.665727588))
        make_face()
    extrude(amount=BOSS_EXTRUDE2_DEPTH)

    # Sketch5 → Cut-Extrude2 (cut, two sides: drawn at the far end of the back side and taken through both)
    with BuildSketch(Plane(origin=(-224.05268026, 0, 0), x_dir=(0, 0, -1), z_dir=(1, 0, 0)).offset(-CUT_EXTRUDE2_DEPTH_BACK)):
        with Locations(Location((228.965727588, 33.597339236, 0), (0, 0, 180))):
            Circle(SKETCH5_R)
    extrude(amount=CUT_EXTRUDE2_DEPTH + CUT_EXTRUDE2_DEPTH_BACK, mode=Mode.SUBTRACT)

    # Sketch6 → Boss-Extrude3 (add)
    with BuildSketch(Plane(origin=(0, 29.977339236, 0), x_dir=(1, 0, 0), z_dir=(0, 1, 0))):
        with BuildLine():
            Line((-224.05268026, 254.665727588), (-224.85268026, 254.665727588))
            Line((-224.85268026, 254.665727588), (-224.85268026, 255.465727588))
            Line((-224.85268026, 255.465727588), (-224.85268026, 260.465727588))
            Line((-224.85268026, 260.465727588), (-221.85268026, 260.465727588))
            add(Edge.make_bspline(
                [(-220.75268026, 259.365727588), (-220.75268026, 259.512006357), (-220.776033562, 259.656809213), (-220.853581882, 259.86067289), (-220.885908043, 259.925140659), (-220.96393381, 260.046876505), (-221.010276016, 260.104613988), (-221.163760572, 260.258337859), (-221.289329911, 260.338636524), (-221.559862209, 260.441881044), (-221.706261645, 260.465727588), (-221.85268026, 260.465727588)],
                knots=[0, 0, 0, 0, 0.25, 0.25, 0.375, 0.375, 0.5, 0.5, 0.75, 0.75, 1, 1, 1, 1], degree=3))
            Line((-220.75268026, 259.365727588), (-220.75268026, 255.465727588))
            Line((-220.75268026, 255.465727588), (-220.75268026, 254.665727588))
            Line((-220.75268026, 254.665727588), (-221.55268026, 254.665727588))
            Line((-221.55268026, 254.665727588), (-221.55268026, 259.365727588))
            add(Edge.make_bspline(
                [(-221.55268026, 259.365727588), (-221.55268026, 259.665727588), (-221.85268026, 259.665727588)],
                knots=[0, 0, 0, 1, 1, 1], degree=2))
            Line((-221.85268026, 259.665727588), (-224.05268026, 259.665727588))
            Line((-224.05268026, 259.665727588), (-224.05268026, 254.665727588))
        make_face()
    extrude(amount=BOSS_EXTRUDE3_DEPTH)

    # Sketch8 → Cut-Extrude3 (cut, two sides: drawn at the far end of the back side and taken through both)
    with BuildSketch(Plane(origin=(-224.05268026, 0, 0), x_dir=(0, 0, -1), z_dir=(1, 0, 0)).offset(-CUT_EXTRUDE3_DEPTH_BACK)):
        with Locations(Location((257.165727588, 33.597339236, 0), (0, 0, 180))):
            Circle(SKETCH8_R)
    extrude(amount=CUT_EXTRUDE3_DEPTH + CUT_EXTRUDE3_DEPTH_BACK, mode=Mode.SUBTRACT)


solid = part.part
